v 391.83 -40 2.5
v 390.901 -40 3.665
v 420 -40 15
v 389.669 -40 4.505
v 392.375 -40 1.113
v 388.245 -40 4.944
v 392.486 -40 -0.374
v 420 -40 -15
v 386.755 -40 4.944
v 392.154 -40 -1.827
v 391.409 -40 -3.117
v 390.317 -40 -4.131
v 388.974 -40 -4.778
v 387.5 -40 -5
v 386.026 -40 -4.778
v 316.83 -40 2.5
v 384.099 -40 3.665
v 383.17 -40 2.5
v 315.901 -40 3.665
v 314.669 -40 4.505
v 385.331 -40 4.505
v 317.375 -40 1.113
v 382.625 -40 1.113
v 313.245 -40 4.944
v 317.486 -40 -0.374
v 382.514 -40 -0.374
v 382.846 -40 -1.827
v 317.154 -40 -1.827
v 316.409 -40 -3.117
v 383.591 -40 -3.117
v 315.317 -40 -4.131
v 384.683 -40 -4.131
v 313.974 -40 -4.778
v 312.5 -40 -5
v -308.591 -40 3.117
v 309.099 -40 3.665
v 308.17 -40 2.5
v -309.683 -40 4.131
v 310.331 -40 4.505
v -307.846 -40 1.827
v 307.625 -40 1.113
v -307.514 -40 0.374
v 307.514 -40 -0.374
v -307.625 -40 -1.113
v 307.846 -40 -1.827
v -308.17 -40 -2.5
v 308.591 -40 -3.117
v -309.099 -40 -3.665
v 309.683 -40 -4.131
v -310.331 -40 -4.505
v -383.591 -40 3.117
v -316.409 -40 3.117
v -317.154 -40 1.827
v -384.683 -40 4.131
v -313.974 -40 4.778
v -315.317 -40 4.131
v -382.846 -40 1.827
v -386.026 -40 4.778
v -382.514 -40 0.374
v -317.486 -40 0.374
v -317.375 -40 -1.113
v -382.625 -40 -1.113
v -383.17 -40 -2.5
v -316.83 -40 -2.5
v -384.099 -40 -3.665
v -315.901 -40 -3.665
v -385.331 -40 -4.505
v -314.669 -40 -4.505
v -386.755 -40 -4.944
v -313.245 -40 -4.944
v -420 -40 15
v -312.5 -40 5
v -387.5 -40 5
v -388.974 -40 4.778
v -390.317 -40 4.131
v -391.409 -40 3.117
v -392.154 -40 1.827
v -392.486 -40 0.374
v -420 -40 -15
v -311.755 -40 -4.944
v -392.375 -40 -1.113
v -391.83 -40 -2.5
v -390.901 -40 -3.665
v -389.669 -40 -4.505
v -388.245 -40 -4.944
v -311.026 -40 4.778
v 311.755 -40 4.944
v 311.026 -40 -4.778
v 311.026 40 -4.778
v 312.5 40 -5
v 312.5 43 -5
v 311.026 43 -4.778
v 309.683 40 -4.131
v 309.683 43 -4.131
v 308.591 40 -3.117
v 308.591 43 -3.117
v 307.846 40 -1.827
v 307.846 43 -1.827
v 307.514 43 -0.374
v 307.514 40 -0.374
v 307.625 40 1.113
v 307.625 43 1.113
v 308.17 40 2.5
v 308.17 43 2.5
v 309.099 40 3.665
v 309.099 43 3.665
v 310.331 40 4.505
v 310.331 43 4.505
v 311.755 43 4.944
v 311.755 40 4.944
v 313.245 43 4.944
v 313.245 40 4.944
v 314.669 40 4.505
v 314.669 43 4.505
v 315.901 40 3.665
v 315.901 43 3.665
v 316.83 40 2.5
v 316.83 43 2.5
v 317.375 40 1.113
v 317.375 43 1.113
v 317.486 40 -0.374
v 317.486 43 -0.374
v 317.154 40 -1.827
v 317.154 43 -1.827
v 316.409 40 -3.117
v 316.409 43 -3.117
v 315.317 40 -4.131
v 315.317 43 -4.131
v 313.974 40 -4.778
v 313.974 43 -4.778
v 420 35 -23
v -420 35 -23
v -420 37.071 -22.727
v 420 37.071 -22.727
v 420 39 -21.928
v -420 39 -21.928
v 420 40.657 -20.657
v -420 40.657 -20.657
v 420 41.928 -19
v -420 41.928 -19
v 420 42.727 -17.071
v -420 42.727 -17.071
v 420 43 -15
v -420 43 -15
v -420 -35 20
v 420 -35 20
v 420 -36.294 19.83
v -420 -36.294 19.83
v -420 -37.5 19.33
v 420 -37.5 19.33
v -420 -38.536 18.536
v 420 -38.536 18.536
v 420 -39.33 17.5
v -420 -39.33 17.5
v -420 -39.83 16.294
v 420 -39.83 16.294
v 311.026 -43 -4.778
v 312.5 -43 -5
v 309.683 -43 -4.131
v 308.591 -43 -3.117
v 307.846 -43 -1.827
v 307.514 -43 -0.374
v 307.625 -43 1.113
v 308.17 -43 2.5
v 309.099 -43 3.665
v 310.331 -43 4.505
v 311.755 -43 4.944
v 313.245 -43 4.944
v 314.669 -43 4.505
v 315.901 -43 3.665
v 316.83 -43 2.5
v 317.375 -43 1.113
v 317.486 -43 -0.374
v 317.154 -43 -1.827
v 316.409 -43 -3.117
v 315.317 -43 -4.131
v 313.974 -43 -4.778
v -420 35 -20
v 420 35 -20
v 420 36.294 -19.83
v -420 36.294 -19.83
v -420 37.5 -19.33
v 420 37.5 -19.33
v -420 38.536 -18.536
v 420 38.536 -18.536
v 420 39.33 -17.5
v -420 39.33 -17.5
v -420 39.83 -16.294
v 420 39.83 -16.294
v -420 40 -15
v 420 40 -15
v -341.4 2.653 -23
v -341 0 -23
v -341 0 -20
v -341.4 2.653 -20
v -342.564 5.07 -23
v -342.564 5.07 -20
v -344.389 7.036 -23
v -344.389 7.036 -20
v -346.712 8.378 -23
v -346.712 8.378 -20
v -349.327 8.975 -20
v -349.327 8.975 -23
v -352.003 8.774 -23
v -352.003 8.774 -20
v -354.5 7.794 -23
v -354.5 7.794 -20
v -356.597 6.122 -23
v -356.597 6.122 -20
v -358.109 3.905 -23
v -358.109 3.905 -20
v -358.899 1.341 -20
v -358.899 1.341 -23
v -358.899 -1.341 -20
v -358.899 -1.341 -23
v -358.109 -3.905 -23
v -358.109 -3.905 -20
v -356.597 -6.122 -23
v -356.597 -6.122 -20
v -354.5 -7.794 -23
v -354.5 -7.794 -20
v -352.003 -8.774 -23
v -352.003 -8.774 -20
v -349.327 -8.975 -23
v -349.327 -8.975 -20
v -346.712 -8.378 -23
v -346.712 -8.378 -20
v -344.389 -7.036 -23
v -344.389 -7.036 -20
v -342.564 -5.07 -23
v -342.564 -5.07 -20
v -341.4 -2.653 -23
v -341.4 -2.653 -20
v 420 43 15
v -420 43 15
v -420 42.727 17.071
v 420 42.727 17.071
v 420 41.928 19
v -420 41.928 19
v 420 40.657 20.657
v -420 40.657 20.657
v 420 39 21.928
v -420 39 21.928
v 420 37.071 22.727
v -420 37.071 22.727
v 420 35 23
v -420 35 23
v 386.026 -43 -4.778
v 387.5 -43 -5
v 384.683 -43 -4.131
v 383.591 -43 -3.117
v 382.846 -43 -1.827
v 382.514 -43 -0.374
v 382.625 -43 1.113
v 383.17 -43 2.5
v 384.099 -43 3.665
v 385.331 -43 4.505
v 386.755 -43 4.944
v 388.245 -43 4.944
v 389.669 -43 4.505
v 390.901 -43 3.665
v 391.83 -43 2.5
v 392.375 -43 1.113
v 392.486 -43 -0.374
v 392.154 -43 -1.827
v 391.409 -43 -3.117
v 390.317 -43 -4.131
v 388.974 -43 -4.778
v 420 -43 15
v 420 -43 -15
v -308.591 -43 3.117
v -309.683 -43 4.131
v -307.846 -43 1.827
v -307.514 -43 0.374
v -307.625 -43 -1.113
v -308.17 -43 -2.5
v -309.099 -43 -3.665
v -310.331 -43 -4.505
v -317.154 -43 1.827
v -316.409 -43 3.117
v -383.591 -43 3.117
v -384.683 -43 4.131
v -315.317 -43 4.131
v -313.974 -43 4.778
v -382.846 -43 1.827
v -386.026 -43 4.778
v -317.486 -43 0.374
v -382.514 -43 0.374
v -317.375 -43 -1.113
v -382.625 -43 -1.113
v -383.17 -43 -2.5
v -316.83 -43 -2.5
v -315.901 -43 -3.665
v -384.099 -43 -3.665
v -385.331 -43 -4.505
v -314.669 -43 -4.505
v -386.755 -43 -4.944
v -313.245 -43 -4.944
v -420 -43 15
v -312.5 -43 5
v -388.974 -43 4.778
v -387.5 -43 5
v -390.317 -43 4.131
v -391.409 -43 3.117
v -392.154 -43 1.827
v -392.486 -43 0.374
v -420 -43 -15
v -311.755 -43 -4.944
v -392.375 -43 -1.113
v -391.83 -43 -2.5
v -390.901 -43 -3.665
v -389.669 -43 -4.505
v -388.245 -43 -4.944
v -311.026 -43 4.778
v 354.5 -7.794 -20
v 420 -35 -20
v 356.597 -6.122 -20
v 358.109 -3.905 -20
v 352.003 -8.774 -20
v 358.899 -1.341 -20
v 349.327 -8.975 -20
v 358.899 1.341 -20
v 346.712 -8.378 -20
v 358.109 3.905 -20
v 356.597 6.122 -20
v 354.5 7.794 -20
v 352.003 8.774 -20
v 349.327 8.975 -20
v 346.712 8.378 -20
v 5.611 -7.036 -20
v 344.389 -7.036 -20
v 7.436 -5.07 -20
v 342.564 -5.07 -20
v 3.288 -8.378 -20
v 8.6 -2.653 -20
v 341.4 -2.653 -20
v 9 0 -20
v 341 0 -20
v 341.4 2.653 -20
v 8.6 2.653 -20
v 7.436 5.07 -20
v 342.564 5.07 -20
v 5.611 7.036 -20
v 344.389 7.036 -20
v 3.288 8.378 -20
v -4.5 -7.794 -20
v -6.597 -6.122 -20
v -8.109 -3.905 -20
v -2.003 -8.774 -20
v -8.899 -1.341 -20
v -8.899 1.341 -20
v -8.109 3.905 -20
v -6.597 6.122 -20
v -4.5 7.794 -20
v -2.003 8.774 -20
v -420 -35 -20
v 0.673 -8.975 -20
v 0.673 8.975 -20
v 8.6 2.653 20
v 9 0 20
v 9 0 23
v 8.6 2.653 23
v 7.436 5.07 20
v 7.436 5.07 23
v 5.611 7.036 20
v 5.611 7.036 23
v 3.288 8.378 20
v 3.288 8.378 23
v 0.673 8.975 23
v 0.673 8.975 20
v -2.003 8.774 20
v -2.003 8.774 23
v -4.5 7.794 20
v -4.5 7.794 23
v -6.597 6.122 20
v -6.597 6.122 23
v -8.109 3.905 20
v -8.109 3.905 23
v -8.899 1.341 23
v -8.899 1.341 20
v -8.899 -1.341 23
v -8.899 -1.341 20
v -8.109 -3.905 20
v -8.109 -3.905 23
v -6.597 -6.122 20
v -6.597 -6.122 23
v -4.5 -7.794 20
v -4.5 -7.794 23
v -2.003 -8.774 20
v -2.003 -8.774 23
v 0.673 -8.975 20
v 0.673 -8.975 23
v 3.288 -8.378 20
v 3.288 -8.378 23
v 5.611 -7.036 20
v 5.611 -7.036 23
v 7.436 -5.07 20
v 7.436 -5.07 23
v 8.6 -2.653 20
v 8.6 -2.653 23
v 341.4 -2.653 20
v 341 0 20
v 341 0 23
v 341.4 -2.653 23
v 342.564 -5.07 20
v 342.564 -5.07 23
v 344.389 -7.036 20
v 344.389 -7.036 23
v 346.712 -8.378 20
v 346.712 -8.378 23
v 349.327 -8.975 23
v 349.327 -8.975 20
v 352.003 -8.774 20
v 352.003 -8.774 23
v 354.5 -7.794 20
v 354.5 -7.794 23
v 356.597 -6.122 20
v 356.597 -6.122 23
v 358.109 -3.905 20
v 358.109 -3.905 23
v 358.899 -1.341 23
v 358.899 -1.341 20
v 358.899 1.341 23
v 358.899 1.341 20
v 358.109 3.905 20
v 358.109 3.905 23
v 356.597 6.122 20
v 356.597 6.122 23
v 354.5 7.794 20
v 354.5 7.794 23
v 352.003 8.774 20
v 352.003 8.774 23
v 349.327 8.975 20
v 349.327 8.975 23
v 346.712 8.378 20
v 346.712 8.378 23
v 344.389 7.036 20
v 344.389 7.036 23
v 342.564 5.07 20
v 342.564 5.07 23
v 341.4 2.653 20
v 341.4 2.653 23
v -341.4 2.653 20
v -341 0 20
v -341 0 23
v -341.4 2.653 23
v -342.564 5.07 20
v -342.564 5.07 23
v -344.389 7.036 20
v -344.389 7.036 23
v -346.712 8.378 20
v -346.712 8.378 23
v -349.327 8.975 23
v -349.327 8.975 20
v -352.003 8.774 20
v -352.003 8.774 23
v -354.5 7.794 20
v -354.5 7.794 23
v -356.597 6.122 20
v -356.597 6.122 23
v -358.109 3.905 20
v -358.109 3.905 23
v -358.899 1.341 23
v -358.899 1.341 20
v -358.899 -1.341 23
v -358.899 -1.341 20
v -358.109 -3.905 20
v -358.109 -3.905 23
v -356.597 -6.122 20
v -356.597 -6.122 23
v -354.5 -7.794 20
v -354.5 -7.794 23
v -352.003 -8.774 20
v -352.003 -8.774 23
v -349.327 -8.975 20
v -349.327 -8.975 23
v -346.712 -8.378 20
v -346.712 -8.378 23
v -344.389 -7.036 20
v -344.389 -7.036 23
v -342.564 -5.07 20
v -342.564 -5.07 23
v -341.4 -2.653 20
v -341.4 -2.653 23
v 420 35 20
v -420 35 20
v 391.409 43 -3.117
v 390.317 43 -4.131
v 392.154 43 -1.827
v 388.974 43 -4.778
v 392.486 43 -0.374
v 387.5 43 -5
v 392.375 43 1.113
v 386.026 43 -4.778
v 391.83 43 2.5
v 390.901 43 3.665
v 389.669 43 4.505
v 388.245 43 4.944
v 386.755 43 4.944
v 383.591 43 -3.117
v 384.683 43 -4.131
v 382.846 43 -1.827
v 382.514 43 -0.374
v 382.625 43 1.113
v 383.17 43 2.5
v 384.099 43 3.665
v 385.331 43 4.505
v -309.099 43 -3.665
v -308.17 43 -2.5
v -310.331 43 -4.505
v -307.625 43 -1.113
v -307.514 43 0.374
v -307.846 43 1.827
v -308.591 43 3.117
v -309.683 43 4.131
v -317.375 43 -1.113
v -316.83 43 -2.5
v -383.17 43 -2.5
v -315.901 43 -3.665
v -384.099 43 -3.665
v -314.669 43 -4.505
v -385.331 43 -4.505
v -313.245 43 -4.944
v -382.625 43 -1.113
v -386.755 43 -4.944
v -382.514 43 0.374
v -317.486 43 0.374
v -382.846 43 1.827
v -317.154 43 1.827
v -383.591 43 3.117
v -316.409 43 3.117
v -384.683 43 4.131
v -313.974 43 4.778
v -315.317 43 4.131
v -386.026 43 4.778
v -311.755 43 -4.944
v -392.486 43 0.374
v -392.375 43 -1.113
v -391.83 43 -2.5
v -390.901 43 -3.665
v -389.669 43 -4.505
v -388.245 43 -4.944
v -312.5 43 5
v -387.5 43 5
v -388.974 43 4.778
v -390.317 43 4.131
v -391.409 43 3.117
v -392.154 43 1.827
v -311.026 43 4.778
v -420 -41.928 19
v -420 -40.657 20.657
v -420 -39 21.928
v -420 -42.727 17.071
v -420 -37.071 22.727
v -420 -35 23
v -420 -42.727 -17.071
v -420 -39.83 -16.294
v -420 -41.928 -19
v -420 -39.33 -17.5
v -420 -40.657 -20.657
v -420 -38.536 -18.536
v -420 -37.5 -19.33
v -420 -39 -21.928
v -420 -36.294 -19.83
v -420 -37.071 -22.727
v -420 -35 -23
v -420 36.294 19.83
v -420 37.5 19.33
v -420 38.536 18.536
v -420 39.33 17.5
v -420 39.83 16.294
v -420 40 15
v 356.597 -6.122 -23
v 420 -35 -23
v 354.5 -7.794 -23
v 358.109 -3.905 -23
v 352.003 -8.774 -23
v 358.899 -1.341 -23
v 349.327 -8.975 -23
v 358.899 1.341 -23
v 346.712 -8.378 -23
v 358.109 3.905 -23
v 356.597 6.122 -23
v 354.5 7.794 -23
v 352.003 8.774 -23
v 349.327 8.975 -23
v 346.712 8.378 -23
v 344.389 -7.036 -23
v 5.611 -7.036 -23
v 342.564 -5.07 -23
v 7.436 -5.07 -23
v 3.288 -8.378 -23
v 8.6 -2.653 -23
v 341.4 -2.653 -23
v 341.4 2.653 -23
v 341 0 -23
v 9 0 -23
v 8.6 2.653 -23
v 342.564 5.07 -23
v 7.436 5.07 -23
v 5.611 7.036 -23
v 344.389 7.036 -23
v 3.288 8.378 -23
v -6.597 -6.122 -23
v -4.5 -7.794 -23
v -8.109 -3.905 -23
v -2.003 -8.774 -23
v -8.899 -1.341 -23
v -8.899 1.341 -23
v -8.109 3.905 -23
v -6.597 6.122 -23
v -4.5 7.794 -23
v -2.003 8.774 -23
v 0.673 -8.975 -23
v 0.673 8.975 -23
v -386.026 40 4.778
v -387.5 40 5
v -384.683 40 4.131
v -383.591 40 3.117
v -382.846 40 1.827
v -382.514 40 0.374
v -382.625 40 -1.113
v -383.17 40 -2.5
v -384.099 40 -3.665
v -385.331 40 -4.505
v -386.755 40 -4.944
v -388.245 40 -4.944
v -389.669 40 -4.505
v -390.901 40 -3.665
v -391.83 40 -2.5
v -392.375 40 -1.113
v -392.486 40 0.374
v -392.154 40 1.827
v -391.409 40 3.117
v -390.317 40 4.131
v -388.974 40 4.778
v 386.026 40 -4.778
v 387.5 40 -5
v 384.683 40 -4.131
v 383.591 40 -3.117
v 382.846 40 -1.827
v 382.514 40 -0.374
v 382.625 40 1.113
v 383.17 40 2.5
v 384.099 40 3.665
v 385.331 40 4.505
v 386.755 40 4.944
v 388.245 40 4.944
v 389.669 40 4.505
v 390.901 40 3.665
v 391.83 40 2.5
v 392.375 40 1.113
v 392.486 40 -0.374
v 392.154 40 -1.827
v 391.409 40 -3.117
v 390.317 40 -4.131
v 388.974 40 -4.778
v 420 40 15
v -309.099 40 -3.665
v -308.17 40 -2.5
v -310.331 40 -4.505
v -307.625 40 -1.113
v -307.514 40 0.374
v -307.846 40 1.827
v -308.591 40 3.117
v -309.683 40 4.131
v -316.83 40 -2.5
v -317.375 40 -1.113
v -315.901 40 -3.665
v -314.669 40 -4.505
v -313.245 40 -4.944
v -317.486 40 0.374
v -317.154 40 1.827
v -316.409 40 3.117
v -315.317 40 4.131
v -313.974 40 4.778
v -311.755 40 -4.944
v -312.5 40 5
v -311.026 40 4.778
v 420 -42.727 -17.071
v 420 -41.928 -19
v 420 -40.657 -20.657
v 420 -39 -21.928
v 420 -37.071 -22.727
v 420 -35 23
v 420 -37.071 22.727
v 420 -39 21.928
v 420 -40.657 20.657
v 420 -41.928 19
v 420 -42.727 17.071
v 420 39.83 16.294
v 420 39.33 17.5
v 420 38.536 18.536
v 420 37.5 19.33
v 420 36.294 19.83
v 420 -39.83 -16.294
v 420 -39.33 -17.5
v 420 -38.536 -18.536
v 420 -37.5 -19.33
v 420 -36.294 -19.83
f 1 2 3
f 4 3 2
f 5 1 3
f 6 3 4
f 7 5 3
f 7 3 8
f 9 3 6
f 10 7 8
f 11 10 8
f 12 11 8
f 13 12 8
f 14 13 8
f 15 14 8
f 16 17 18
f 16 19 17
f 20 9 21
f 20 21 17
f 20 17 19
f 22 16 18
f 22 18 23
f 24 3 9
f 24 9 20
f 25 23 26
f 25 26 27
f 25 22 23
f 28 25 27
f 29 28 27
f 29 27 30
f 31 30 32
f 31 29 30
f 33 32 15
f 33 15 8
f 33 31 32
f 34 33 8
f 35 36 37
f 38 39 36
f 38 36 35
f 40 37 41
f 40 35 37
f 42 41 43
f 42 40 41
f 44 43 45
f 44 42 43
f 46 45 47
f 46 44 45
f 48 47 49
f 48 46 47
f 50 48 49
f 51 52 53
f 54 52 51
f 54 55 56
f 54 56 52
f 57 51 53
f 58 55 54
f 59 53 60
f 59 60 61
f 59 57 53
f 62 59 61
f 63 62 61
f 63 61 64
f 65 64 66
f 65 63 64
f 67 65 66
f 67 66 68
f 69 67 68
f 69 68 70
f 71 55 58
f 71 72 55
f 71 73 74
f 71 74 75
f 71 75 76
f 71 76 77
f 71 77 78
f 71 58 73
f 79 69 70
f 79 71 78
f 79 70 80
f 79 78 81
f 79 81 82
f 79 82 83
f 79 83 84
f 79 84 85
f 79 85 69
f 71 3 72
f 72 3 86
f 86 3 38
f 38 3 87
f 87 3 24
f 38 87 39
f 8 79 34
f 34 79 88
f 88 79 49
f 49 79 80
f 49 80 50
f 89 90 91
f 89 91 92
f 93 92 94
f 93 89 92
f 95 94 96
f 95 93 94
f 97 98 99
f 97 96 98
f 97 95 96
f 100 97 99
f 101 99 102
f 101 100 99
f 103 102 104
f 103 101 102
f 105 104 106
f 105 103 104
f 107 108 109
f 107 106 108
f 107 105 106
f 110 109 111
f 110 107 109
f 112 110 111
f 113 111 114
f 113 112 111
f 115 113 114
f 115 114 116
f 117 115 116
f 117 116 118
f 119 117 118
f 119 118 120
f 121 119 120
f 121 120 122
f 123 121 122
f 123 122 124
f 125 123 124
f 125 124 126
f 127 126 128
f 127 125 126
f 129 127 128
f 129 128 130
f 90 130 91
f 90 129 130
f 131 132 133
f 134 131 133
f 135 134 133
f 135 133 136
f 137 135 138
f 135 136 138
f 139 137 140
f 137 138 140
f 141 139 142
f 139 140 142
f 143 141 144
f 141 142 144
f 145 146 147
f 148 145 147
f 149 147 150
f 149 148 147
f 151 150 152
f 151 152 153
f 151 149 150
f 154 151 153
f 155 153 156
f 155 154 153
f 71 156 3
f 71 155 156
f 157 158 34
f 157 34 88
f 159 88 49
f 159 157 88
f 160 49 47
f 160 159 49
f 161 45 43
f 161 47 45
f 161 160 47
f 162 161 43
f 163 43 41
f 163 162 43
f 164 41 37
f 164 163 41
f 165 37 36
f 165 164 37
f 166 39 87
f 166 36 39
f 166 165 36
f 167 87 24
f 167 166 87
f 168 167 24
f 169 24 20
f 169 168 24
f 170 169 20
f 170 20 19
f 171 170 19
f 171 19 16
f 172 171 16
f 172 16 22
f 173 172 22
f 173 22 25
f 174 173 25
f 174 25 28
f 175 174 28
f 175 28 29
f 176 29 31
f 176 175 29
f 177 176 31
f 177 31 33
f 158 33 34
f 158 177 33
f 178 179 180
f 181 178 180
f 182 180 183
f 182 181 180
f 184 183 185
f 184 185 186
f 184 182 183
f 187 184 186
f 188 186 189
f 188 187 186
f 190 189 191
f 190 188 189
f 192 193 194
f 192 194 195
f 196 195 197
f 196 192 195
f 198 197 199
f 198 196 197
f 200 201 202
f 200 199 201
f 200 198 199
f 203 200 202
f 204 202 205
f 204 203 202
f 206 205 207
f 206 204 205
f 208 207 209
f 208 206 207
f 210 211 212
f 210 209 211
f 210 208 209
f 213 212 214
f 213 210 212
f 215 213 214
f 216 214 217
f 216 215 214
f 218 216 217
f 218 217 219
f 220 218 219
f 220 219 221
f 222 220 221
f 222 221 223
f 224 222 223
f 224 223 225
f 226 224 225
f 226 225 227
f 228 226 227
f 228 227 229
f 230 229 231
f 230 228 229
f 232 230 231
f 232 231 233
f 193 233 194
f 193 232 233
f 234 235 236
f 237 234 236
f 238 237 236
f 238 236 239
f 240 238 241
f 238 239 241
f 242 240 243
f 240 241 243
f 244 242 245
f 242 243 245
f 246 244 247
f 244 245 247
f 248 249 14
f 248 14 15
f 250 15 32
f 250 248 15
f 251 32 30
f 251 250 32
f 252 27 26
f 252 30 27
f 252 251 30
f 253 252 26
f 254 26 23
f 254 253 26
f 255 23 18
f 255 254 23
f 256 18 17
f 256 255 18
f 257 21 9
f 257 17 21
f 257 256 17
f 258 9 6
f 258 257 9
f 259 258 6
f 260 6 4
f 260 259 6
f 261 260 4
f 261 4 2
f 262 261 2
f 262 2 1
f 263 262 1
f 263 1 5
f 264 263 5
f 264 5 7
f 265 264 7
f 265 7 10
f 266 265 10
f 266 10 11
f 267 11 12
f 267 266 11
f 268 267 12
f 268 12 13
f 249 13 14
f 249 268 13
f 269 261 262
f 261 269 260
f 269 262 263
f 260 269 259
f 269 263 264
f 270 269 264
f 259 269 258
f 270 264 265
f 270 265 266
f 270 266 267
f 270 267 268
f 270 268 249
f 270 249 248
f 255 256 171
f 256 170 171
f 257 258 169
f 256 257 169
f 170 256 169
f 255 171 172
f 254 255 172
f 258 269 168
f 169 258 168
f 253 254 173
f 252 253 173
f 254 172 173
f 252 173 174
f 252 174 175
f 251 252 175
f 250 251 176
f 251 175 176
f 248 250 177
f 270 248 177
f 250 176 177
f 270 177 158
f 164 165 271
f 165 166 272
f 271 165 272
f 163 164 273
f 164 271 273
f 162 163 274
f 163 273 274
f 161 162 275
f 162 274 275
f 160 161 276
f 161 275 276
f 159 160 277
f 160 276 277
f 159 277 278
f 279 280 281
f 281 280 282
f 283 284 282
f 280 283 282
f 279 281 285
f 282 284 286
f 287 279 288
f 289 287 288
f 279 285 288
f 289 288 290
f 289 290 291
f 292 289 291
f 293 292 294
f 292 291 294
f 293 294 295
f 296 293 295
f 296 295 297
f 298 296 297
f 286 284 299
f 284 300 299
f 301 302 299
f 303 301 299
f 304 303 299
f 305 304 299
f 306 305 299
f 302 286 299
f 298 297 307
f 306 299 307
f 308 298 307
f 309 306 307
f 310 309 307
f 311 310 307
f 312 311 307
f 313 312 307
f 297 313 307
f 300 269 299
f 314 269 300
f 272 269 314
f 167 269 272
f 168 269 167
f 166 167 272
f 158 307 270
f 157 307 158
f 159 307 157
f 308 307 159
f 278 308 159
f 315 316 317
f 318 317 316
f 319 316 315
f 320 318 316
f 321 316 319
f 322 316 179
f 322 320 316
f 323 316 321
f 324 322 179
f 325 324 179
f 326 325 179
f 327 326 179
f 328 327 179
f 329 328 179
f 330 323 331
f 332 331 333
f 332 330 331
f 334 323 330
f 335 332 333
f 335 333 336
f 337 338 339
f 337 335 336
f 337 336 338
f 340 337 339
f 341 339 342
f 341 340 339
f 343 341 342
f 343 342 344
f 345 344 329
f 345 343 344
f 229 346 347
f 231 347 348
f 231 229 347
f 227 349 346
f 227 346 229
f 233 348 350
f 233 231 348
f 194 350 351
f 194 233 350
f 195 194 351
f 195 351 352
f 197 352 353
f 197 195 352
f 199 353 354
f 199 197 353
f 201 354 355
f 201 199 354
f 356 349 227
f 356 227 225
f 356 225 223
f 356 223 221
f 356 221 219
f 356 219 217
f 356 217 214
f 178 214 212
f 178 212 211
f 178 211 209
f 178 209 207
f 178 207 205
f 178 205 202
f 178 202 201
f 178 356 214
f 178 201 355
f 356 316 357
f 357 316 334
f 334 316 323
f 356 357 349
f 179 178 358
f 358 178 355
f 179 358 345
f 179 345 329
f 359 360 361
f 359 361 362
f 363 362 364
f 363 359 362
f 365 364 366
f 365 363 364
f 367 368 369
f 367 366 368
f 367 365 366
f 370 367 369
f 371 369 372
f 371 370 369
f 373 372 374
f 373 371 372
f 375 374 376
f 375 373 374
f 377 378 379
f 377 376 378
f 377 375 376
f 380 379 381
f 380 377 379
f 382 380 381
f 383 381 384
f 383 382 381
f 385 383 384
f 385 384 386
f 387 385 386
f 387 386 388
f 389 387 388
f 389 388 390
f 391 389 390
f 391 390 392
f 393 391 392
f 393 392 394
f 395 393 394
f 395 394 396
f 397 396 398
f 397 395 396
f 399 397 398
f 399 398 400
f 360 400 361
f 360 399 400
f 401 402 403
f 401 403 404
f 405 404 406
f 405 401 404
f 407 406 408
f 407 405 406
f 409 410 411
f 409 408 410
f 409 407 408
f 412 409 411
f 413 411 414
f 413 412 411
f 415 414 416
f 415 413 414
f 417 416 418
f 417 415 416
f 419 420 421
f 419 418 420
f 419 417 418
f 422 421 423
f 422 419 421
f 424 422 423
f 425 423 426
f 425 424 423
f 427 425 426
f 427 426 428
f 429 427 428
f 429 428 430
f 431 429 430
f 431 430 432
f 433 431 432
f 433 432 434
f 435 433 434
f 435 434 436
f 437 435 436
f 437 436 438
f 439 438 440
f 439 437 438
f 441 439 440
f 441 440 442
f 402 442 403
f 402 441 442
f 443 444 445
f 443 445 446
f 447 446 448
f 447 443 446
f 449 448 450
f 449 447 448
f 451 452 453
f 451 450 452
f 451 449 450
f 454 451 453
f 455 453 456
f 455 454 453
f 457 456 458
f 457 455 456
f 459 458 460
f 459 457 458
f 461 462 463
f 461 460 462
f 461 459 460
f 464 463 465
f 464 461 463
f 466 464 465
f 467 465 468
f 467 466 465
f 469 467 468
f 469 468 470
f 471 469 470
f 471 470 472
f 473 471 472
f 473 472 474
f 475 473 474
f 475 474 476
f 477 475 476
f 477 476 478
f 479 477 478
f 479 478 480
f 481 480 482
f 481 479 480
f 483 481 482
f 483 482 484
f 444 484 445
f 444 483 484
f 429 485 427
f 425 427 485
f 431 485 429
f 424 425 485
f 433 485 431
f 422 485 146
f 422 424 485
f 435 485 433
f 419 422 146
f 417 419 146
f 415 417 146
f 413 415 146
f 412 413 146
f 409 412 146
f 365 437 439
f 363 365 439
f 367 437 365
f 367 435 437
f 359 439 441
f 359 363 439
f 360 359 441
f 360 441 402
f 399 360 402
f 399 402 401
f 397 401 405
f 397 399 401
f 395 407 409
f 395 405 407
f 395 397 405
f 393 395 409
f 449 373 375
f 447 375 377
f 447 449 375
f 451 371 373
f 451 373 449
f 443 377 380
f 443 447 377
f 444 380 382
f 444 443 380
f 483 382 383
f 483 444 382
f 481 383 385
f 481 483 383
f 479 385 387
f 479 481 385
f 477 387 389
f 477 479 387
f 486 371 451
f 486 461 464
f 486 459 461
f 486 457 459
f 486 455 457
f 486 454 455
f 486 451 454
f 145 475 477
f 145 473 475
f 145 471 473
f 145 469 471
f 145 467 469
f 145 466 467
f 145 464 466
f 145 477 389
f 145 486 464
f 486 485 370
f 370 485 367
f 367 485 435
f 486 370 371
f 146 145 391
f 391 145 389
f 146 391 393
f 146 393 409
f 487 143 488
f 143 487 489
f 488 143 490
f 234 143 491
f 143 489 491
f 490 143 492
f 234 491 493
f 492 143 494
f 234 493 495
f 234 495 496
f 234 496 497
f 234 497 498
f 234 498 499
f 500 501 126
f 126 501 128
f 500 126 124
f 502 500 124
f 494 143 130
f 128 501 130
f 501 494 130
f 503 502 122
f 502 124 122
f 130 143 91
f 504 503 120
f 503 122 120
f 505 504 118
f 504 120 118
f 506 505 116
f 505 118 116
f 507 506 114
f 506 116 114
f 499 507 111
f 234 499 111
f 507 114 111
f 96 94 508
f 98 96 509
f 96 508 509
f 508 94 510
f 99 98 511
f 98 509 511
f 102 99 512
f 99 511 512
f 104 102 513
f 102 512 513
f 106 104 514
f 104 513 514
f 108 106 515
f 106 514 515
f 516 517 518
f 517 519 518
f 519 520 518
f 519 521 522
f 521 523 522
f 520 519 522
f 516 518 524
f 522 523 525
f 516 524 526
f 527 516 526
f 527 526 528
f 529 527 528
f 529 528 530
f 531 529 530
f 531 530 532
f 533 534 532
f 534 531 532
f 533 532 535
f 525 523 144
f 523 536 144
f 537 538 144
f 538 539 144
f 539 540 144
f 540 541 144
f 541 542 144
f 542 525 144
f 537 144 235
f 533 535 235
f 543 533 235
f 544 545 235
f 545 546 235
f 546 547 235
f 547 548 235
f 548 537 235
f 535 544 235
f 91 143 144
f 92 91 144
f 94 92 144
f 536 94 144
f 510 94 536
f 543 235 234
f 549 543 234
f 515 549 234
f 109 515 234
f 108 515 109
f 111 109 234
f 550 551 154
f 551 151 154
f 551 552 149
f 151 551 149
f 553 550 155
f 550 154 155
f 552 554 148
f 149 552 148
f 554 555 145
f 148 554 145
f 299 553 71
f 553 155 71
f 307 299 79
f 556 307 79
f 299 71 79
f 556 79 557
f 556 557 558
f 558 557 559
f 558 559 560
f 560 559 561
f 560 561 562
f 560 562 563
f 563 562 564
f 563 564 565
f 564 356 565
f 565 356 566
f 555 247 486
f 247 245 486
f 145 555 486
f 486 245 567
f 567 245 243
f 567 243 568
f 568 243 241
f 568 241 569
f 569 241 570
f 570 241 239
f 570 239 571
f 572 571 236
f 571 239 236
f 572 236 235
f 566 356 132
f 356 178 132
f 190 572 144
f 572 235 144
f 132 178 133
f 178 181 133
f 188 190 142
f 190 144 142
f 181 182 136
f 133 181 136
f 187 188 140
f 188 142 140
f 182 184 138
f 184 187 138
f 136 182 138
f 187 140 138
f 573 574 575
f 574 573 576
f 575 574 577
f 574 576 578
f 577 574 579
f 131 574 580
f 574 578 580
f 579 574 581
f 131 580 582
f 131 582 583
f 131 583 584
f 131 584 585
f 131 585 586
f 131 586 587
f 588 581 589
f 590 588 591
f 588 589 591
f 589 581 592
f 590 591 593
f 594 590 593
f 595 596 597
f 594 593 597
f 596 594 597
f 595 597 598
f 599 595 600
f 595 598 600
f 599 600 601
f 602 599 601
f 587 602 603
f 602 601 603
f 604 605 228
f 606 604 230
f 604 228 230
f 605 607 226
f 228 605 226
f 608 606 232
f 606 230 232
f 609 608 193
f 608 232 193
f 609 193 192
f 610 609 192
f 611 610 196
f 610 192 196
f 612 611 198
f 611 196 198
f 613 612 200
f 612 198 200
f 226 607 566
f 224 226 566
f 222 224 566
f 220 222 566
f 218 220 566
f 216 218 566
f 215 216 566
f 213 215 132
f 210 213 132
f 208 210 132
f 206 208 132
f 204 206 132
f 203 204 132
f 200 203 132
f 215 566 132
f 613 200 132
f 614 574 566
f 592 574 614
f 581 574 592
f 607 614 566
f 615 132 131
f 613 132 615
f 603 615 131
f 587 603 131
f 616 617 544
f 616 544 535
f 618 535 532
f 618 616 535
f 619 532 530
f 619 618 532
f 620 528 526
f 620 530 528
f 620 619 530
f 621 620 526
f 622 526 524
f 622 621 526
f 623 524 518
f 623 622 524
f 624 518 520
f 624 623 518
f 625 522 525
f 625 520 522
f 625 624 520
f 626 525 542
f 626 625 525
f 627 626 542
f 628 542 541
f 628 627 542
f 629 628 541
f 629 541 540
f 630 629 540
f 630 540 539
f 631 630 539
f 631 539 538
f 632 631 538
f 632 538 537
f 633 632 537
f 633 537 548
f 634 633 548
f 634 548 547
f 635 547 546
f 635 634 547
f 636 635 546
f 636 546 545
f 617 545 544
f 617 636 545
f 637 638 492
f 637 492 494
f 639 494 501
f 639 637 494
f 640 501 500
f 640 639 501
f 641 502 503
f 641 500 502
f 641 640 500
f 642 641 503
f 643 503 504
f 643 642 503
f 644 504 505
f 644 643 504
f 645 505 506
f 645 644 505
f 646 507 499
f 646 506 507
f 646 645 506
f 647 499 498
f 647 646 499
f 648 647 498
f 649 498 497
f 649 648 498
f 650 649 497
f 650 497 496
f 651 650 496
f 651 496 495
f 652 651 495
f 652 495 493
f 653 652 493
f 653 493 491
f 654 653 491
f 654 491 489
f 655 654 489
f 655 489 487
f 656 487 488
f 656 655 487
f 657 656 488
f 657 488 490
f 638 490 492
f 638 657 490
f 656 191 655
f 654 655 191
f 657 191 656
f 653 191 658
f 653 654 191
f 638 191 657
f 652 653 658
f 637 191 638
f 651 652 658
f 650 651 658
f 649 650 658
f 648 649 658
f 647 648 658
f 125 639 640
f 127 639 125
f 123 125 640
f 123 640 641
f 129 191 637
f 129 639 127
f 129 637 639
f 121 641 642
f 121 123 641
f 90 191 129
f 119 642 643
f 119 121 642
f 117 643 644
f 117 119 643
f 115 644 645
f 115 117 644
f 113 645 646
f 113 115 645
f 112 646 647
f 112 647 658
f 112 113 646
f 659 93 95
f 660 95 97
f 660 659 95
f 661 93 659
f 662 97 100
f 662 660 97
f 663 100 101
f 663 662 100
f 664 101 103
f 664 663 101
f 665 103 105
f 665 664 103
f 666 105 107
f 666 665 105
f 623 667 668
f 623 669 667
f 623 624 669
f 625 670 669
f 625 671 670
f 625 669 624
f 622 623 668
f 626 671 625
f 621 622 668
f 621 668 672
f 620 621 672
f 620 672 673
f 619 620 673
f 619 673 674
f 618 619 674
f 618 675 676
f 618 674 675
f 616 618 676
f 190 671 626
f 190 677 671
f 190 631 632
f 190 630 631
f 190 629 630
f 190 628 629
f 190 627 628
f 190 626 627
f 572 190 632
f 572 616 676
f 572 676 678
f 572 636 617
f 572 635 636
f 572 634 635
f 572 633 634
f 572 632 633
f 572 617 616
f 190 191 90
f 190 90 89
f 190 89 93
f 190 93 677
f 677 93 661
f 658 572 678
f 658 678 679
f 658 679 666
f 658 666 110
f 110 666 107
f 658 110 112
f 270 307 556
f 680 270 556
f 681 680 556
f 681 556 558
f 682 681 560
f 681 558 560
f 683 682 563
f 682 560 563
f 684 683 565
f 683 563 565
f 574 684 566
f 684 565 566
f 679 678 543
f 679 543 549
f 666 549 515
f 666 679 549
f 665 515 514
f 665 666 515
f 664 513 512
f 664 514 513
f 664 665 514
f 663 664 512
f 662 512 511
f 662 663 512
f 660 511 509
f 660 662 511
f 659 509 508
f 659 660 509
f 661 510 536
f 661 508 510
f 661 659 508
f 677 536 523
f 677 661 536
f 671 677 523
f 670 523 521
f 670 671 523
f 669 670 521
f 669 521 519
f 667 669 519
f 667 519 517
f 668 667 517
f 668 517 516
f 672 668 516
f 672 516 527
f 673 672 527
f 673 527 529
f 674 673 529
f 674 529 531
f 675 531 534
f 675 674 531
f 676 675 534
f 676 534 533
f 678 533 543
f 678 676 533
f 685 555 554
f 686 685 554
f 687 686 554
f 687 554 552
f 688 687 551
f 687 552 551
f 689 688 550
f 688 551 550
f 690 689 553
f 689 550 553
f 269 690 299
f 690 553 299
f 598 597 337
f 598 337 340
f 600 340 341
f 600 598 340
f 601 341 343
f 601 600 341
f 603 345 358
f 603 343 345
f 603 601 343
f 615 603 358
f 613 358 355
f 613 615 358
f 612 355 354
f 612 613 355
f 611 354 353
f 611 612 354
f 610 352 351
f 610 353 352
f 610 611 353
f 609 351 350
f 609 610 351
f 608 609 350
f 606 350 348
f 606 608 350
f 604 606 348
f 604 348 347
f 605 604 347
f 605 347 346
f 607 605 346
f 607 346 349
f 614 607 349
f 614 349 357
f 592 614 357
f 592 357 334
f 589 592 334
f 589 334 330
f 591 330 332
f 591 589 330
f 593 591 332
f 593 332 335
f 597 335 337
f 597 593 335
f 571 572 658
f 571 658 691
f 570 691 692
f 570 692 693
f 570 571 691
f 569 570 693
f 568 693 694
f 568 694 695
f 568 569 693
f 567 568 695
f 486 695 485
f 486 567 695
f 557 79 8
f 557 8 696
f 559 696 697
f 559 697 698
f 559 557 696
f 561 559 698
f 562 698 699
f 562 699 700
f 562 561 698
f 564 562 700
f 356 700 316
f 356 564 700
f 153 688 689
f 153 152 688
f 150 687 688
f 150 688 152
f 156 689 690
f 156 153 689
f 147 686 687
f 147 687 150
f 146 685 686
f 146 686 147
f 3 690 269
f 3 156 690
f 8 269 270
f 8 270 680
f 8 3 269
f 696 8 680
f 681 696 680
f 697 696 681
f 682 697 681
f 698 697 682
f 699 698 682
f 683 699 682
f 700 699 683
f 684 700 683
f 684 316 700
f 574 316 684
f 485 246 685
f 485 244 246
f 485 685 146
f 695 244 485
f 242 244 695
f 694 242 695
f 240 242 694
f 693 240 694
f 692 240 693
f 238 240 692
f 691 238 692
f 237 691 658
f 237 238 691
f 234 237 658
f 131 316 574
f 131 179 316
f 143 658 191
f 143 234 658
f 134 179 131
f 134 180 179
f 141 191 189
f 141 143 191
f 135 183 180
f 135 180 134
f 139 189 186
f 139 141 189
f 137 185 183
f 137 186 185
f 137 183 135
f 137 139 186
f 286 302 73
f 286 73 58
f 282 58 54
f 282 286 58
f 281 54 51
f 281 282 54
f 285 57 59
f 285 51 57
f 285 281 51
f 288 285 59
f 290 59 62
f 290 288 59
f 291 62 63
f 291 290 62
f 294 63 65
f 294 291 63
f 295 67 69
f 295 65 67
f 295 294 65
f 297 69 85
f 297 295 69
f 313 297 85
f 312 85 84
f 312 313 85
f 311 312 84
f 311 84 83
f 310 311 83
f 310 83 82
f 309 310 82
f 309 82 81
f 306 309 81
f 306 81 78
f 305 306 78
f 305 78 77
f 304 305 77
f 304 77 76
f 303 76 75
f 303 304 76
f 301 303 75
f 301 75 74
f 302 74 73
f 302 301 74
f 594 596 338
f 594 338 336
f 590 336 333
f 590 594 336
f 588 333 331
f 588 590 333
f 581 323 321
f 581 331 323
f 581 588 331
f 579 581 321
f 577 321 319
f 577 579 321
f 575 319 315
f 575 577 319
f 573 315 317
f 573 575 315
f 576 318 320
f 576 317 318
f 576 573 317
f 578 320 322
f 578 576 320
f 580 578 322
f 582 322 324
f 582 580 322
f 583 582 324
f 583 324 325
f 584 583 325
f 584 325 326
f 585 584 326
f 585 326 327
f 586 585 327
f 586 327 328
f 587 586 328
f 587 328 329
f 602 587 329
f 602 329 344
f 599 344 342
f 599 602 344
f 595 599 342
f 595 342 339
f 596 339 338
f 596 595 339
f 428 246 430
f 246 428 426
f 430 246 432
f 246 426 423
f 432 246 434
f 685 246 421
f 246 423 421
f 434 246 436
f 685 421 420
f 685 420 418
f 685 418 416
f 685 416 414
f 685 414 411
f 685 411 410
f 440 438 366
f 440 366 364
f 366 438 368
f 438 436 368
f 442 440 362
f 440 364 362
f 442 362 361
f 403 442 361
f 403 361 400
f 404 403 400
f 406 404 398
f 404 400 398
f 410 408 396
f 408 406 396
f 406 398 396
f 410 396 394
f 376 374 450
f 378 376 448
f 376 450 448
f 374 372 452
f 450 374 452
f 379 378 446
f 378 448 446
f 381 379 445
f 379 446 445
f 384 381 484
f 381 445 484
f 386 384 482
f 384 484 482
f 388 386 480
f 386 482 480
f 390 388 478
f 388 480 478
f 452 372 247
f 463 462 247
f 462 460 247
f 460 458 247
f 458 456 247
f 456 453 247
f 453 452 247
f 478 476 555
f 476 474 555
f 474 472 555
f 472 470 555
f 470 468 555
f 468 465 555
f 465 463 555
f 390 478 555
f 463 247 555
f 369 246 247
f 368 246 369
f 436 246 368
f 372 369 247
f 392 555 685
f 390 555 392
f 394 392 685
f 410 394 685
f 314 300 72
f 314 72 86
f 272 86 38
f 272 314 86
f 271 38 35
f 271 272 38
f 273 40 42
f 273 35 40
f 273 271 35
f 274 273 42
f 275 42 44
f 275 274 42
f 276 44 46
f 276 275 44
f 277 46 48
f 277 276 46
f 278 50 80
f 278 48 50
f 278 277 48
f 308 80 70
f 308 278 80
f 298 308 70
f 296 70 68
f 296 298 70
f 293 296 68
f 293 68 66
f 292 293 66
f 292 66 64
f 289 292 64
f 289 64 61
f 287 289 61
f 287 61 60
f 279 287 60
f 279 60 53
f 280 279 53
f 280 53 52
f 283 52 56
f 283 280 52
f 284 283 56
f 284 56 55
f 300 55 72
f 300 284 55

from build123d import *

# Parameters (mm, degrees)
EXTRUDE_THIN1_DEPTH      = 420
EXTRUDE_THIN1_DEPTH_BACK = 420
CUT_EXTRUDE1_DEPTH       = 423.82147533
CUT_EXTRUDE1_DEPTH_BACK  = 423.82147533
SKETCH2_R                = 9
CUT_EXTRUDE2_DEPTH       = 423.82147533
CUT_EXTRUDE2_DEPTH_BACK  = 423.82147533
SKETCH3_R                = 5


with BuildPart() as part:
    # Sketch1 → Extrude-Thin1 (new, two sides: drawn at the far end of the back side and taken through both)
    with BuildSketch(Plane(origin=(0, 0, 0), x_dir=(0, 0, -1), z_dir=(1, 0, 0)).offset(-EXTRUDE_THIN1_DEPTH_BACK)):
        with BuildLine():
            Line((-23, 35), (-23, -35))
            ThreePointArc((-23, -35), (-20.656854249, -40.656854249), (-15, -43))
            Line((-15, -43), (15, -43))
            ThreePointArc((15, -43), (20.656854249, -40.656854249), (23, -35))
            Line((23, -35), (23, 35))
            ThreePointArc((23, 35), (20.656854249, 40.656854249), (15, 43))
            Line((15, 43), (-15, 43))
            ThreePointArc((-15, 43), (-20.656854249, 40.656854249), (-23, 35))
        make_face()
        with BuildLine():
            Line((-20, 35), (-20, -35))
            ThreePointArc((-20, -35), (-18.535533906, -38.535533906), (-15, -40))
            Line((-15, -40), (15, -40))
            ThreePointArc((15, -40), (18.535533906, -38.535533906), (20, -35))
            Line((20, -35), (20, 35))
            ThreePointArc((20, 35), (18.535533906, 38.535533906), (15, 40))
            Line((15, 40), (-15, 40))
            ThreePointArc((-15, 40), (-18.535533906, 38.535533906), (-20, 35))
        make_face(mode=Mode.SUBTRACT)
    extrude(amount=EXTRUDE_THIN1_DEPTH + EXTRUDE_THIN1_DEPTH_BACK)

    # Sketch2 → Cut-Extrude1 (cut, two sides: drawn at the far end of the back side and taken through both)
    with BuildSketch(Plane.XY.offset(-CUT_EXTRUDE1_DEPTH_BACK)):
        Circle(SKETCH2_R)
        with Locations((-350, 0)):
            Circle(SKETCH2_R)
        with Locations(Location((350, 0, 0), (0, 0, 180))):
            Circle(SKETCH2_R)
    extrude(amount=CUT_EXTRUDE1_DEPTH + CUT_EXTRUDE1_DEPTH_BACK, mode=Mode.SUBTRACT)

    # Sketch3 → Cut-Extrude2 (cut, two sides: drawn at the far end of the back side and taken through both)
    with BuildSketch(Plane(origin=(0, 0, 0), x_dir=(1, 0, 0), z_dir=(0, 1, 0)).offset(-CUT_EXTRUDE2_DEPTH_BACK)):
        with Locations(Location((-387.5, 0, 0), (0, 0, 270))):
            Circle(SKETCH3_R)
        with Locations(Location((-312.5, 0, 0), (0, 0, 270))):
            Circle(SKETCH3_R)
        with Locations(Location((312.5, 0, 0), (0, 0, 90))):
            Circle(SKETCH3_R)
        with Locations(Location((387.5, 0, 0), (0, 0, 90))):
            Circle(SKETCH3_R)
    extrude(amount=CUT_EXTRUDE2_DEPTH + CUT_EXTRUDE2_DEPTH_BACK, mode=Mode.SUBTRACT)


solid = part.part
